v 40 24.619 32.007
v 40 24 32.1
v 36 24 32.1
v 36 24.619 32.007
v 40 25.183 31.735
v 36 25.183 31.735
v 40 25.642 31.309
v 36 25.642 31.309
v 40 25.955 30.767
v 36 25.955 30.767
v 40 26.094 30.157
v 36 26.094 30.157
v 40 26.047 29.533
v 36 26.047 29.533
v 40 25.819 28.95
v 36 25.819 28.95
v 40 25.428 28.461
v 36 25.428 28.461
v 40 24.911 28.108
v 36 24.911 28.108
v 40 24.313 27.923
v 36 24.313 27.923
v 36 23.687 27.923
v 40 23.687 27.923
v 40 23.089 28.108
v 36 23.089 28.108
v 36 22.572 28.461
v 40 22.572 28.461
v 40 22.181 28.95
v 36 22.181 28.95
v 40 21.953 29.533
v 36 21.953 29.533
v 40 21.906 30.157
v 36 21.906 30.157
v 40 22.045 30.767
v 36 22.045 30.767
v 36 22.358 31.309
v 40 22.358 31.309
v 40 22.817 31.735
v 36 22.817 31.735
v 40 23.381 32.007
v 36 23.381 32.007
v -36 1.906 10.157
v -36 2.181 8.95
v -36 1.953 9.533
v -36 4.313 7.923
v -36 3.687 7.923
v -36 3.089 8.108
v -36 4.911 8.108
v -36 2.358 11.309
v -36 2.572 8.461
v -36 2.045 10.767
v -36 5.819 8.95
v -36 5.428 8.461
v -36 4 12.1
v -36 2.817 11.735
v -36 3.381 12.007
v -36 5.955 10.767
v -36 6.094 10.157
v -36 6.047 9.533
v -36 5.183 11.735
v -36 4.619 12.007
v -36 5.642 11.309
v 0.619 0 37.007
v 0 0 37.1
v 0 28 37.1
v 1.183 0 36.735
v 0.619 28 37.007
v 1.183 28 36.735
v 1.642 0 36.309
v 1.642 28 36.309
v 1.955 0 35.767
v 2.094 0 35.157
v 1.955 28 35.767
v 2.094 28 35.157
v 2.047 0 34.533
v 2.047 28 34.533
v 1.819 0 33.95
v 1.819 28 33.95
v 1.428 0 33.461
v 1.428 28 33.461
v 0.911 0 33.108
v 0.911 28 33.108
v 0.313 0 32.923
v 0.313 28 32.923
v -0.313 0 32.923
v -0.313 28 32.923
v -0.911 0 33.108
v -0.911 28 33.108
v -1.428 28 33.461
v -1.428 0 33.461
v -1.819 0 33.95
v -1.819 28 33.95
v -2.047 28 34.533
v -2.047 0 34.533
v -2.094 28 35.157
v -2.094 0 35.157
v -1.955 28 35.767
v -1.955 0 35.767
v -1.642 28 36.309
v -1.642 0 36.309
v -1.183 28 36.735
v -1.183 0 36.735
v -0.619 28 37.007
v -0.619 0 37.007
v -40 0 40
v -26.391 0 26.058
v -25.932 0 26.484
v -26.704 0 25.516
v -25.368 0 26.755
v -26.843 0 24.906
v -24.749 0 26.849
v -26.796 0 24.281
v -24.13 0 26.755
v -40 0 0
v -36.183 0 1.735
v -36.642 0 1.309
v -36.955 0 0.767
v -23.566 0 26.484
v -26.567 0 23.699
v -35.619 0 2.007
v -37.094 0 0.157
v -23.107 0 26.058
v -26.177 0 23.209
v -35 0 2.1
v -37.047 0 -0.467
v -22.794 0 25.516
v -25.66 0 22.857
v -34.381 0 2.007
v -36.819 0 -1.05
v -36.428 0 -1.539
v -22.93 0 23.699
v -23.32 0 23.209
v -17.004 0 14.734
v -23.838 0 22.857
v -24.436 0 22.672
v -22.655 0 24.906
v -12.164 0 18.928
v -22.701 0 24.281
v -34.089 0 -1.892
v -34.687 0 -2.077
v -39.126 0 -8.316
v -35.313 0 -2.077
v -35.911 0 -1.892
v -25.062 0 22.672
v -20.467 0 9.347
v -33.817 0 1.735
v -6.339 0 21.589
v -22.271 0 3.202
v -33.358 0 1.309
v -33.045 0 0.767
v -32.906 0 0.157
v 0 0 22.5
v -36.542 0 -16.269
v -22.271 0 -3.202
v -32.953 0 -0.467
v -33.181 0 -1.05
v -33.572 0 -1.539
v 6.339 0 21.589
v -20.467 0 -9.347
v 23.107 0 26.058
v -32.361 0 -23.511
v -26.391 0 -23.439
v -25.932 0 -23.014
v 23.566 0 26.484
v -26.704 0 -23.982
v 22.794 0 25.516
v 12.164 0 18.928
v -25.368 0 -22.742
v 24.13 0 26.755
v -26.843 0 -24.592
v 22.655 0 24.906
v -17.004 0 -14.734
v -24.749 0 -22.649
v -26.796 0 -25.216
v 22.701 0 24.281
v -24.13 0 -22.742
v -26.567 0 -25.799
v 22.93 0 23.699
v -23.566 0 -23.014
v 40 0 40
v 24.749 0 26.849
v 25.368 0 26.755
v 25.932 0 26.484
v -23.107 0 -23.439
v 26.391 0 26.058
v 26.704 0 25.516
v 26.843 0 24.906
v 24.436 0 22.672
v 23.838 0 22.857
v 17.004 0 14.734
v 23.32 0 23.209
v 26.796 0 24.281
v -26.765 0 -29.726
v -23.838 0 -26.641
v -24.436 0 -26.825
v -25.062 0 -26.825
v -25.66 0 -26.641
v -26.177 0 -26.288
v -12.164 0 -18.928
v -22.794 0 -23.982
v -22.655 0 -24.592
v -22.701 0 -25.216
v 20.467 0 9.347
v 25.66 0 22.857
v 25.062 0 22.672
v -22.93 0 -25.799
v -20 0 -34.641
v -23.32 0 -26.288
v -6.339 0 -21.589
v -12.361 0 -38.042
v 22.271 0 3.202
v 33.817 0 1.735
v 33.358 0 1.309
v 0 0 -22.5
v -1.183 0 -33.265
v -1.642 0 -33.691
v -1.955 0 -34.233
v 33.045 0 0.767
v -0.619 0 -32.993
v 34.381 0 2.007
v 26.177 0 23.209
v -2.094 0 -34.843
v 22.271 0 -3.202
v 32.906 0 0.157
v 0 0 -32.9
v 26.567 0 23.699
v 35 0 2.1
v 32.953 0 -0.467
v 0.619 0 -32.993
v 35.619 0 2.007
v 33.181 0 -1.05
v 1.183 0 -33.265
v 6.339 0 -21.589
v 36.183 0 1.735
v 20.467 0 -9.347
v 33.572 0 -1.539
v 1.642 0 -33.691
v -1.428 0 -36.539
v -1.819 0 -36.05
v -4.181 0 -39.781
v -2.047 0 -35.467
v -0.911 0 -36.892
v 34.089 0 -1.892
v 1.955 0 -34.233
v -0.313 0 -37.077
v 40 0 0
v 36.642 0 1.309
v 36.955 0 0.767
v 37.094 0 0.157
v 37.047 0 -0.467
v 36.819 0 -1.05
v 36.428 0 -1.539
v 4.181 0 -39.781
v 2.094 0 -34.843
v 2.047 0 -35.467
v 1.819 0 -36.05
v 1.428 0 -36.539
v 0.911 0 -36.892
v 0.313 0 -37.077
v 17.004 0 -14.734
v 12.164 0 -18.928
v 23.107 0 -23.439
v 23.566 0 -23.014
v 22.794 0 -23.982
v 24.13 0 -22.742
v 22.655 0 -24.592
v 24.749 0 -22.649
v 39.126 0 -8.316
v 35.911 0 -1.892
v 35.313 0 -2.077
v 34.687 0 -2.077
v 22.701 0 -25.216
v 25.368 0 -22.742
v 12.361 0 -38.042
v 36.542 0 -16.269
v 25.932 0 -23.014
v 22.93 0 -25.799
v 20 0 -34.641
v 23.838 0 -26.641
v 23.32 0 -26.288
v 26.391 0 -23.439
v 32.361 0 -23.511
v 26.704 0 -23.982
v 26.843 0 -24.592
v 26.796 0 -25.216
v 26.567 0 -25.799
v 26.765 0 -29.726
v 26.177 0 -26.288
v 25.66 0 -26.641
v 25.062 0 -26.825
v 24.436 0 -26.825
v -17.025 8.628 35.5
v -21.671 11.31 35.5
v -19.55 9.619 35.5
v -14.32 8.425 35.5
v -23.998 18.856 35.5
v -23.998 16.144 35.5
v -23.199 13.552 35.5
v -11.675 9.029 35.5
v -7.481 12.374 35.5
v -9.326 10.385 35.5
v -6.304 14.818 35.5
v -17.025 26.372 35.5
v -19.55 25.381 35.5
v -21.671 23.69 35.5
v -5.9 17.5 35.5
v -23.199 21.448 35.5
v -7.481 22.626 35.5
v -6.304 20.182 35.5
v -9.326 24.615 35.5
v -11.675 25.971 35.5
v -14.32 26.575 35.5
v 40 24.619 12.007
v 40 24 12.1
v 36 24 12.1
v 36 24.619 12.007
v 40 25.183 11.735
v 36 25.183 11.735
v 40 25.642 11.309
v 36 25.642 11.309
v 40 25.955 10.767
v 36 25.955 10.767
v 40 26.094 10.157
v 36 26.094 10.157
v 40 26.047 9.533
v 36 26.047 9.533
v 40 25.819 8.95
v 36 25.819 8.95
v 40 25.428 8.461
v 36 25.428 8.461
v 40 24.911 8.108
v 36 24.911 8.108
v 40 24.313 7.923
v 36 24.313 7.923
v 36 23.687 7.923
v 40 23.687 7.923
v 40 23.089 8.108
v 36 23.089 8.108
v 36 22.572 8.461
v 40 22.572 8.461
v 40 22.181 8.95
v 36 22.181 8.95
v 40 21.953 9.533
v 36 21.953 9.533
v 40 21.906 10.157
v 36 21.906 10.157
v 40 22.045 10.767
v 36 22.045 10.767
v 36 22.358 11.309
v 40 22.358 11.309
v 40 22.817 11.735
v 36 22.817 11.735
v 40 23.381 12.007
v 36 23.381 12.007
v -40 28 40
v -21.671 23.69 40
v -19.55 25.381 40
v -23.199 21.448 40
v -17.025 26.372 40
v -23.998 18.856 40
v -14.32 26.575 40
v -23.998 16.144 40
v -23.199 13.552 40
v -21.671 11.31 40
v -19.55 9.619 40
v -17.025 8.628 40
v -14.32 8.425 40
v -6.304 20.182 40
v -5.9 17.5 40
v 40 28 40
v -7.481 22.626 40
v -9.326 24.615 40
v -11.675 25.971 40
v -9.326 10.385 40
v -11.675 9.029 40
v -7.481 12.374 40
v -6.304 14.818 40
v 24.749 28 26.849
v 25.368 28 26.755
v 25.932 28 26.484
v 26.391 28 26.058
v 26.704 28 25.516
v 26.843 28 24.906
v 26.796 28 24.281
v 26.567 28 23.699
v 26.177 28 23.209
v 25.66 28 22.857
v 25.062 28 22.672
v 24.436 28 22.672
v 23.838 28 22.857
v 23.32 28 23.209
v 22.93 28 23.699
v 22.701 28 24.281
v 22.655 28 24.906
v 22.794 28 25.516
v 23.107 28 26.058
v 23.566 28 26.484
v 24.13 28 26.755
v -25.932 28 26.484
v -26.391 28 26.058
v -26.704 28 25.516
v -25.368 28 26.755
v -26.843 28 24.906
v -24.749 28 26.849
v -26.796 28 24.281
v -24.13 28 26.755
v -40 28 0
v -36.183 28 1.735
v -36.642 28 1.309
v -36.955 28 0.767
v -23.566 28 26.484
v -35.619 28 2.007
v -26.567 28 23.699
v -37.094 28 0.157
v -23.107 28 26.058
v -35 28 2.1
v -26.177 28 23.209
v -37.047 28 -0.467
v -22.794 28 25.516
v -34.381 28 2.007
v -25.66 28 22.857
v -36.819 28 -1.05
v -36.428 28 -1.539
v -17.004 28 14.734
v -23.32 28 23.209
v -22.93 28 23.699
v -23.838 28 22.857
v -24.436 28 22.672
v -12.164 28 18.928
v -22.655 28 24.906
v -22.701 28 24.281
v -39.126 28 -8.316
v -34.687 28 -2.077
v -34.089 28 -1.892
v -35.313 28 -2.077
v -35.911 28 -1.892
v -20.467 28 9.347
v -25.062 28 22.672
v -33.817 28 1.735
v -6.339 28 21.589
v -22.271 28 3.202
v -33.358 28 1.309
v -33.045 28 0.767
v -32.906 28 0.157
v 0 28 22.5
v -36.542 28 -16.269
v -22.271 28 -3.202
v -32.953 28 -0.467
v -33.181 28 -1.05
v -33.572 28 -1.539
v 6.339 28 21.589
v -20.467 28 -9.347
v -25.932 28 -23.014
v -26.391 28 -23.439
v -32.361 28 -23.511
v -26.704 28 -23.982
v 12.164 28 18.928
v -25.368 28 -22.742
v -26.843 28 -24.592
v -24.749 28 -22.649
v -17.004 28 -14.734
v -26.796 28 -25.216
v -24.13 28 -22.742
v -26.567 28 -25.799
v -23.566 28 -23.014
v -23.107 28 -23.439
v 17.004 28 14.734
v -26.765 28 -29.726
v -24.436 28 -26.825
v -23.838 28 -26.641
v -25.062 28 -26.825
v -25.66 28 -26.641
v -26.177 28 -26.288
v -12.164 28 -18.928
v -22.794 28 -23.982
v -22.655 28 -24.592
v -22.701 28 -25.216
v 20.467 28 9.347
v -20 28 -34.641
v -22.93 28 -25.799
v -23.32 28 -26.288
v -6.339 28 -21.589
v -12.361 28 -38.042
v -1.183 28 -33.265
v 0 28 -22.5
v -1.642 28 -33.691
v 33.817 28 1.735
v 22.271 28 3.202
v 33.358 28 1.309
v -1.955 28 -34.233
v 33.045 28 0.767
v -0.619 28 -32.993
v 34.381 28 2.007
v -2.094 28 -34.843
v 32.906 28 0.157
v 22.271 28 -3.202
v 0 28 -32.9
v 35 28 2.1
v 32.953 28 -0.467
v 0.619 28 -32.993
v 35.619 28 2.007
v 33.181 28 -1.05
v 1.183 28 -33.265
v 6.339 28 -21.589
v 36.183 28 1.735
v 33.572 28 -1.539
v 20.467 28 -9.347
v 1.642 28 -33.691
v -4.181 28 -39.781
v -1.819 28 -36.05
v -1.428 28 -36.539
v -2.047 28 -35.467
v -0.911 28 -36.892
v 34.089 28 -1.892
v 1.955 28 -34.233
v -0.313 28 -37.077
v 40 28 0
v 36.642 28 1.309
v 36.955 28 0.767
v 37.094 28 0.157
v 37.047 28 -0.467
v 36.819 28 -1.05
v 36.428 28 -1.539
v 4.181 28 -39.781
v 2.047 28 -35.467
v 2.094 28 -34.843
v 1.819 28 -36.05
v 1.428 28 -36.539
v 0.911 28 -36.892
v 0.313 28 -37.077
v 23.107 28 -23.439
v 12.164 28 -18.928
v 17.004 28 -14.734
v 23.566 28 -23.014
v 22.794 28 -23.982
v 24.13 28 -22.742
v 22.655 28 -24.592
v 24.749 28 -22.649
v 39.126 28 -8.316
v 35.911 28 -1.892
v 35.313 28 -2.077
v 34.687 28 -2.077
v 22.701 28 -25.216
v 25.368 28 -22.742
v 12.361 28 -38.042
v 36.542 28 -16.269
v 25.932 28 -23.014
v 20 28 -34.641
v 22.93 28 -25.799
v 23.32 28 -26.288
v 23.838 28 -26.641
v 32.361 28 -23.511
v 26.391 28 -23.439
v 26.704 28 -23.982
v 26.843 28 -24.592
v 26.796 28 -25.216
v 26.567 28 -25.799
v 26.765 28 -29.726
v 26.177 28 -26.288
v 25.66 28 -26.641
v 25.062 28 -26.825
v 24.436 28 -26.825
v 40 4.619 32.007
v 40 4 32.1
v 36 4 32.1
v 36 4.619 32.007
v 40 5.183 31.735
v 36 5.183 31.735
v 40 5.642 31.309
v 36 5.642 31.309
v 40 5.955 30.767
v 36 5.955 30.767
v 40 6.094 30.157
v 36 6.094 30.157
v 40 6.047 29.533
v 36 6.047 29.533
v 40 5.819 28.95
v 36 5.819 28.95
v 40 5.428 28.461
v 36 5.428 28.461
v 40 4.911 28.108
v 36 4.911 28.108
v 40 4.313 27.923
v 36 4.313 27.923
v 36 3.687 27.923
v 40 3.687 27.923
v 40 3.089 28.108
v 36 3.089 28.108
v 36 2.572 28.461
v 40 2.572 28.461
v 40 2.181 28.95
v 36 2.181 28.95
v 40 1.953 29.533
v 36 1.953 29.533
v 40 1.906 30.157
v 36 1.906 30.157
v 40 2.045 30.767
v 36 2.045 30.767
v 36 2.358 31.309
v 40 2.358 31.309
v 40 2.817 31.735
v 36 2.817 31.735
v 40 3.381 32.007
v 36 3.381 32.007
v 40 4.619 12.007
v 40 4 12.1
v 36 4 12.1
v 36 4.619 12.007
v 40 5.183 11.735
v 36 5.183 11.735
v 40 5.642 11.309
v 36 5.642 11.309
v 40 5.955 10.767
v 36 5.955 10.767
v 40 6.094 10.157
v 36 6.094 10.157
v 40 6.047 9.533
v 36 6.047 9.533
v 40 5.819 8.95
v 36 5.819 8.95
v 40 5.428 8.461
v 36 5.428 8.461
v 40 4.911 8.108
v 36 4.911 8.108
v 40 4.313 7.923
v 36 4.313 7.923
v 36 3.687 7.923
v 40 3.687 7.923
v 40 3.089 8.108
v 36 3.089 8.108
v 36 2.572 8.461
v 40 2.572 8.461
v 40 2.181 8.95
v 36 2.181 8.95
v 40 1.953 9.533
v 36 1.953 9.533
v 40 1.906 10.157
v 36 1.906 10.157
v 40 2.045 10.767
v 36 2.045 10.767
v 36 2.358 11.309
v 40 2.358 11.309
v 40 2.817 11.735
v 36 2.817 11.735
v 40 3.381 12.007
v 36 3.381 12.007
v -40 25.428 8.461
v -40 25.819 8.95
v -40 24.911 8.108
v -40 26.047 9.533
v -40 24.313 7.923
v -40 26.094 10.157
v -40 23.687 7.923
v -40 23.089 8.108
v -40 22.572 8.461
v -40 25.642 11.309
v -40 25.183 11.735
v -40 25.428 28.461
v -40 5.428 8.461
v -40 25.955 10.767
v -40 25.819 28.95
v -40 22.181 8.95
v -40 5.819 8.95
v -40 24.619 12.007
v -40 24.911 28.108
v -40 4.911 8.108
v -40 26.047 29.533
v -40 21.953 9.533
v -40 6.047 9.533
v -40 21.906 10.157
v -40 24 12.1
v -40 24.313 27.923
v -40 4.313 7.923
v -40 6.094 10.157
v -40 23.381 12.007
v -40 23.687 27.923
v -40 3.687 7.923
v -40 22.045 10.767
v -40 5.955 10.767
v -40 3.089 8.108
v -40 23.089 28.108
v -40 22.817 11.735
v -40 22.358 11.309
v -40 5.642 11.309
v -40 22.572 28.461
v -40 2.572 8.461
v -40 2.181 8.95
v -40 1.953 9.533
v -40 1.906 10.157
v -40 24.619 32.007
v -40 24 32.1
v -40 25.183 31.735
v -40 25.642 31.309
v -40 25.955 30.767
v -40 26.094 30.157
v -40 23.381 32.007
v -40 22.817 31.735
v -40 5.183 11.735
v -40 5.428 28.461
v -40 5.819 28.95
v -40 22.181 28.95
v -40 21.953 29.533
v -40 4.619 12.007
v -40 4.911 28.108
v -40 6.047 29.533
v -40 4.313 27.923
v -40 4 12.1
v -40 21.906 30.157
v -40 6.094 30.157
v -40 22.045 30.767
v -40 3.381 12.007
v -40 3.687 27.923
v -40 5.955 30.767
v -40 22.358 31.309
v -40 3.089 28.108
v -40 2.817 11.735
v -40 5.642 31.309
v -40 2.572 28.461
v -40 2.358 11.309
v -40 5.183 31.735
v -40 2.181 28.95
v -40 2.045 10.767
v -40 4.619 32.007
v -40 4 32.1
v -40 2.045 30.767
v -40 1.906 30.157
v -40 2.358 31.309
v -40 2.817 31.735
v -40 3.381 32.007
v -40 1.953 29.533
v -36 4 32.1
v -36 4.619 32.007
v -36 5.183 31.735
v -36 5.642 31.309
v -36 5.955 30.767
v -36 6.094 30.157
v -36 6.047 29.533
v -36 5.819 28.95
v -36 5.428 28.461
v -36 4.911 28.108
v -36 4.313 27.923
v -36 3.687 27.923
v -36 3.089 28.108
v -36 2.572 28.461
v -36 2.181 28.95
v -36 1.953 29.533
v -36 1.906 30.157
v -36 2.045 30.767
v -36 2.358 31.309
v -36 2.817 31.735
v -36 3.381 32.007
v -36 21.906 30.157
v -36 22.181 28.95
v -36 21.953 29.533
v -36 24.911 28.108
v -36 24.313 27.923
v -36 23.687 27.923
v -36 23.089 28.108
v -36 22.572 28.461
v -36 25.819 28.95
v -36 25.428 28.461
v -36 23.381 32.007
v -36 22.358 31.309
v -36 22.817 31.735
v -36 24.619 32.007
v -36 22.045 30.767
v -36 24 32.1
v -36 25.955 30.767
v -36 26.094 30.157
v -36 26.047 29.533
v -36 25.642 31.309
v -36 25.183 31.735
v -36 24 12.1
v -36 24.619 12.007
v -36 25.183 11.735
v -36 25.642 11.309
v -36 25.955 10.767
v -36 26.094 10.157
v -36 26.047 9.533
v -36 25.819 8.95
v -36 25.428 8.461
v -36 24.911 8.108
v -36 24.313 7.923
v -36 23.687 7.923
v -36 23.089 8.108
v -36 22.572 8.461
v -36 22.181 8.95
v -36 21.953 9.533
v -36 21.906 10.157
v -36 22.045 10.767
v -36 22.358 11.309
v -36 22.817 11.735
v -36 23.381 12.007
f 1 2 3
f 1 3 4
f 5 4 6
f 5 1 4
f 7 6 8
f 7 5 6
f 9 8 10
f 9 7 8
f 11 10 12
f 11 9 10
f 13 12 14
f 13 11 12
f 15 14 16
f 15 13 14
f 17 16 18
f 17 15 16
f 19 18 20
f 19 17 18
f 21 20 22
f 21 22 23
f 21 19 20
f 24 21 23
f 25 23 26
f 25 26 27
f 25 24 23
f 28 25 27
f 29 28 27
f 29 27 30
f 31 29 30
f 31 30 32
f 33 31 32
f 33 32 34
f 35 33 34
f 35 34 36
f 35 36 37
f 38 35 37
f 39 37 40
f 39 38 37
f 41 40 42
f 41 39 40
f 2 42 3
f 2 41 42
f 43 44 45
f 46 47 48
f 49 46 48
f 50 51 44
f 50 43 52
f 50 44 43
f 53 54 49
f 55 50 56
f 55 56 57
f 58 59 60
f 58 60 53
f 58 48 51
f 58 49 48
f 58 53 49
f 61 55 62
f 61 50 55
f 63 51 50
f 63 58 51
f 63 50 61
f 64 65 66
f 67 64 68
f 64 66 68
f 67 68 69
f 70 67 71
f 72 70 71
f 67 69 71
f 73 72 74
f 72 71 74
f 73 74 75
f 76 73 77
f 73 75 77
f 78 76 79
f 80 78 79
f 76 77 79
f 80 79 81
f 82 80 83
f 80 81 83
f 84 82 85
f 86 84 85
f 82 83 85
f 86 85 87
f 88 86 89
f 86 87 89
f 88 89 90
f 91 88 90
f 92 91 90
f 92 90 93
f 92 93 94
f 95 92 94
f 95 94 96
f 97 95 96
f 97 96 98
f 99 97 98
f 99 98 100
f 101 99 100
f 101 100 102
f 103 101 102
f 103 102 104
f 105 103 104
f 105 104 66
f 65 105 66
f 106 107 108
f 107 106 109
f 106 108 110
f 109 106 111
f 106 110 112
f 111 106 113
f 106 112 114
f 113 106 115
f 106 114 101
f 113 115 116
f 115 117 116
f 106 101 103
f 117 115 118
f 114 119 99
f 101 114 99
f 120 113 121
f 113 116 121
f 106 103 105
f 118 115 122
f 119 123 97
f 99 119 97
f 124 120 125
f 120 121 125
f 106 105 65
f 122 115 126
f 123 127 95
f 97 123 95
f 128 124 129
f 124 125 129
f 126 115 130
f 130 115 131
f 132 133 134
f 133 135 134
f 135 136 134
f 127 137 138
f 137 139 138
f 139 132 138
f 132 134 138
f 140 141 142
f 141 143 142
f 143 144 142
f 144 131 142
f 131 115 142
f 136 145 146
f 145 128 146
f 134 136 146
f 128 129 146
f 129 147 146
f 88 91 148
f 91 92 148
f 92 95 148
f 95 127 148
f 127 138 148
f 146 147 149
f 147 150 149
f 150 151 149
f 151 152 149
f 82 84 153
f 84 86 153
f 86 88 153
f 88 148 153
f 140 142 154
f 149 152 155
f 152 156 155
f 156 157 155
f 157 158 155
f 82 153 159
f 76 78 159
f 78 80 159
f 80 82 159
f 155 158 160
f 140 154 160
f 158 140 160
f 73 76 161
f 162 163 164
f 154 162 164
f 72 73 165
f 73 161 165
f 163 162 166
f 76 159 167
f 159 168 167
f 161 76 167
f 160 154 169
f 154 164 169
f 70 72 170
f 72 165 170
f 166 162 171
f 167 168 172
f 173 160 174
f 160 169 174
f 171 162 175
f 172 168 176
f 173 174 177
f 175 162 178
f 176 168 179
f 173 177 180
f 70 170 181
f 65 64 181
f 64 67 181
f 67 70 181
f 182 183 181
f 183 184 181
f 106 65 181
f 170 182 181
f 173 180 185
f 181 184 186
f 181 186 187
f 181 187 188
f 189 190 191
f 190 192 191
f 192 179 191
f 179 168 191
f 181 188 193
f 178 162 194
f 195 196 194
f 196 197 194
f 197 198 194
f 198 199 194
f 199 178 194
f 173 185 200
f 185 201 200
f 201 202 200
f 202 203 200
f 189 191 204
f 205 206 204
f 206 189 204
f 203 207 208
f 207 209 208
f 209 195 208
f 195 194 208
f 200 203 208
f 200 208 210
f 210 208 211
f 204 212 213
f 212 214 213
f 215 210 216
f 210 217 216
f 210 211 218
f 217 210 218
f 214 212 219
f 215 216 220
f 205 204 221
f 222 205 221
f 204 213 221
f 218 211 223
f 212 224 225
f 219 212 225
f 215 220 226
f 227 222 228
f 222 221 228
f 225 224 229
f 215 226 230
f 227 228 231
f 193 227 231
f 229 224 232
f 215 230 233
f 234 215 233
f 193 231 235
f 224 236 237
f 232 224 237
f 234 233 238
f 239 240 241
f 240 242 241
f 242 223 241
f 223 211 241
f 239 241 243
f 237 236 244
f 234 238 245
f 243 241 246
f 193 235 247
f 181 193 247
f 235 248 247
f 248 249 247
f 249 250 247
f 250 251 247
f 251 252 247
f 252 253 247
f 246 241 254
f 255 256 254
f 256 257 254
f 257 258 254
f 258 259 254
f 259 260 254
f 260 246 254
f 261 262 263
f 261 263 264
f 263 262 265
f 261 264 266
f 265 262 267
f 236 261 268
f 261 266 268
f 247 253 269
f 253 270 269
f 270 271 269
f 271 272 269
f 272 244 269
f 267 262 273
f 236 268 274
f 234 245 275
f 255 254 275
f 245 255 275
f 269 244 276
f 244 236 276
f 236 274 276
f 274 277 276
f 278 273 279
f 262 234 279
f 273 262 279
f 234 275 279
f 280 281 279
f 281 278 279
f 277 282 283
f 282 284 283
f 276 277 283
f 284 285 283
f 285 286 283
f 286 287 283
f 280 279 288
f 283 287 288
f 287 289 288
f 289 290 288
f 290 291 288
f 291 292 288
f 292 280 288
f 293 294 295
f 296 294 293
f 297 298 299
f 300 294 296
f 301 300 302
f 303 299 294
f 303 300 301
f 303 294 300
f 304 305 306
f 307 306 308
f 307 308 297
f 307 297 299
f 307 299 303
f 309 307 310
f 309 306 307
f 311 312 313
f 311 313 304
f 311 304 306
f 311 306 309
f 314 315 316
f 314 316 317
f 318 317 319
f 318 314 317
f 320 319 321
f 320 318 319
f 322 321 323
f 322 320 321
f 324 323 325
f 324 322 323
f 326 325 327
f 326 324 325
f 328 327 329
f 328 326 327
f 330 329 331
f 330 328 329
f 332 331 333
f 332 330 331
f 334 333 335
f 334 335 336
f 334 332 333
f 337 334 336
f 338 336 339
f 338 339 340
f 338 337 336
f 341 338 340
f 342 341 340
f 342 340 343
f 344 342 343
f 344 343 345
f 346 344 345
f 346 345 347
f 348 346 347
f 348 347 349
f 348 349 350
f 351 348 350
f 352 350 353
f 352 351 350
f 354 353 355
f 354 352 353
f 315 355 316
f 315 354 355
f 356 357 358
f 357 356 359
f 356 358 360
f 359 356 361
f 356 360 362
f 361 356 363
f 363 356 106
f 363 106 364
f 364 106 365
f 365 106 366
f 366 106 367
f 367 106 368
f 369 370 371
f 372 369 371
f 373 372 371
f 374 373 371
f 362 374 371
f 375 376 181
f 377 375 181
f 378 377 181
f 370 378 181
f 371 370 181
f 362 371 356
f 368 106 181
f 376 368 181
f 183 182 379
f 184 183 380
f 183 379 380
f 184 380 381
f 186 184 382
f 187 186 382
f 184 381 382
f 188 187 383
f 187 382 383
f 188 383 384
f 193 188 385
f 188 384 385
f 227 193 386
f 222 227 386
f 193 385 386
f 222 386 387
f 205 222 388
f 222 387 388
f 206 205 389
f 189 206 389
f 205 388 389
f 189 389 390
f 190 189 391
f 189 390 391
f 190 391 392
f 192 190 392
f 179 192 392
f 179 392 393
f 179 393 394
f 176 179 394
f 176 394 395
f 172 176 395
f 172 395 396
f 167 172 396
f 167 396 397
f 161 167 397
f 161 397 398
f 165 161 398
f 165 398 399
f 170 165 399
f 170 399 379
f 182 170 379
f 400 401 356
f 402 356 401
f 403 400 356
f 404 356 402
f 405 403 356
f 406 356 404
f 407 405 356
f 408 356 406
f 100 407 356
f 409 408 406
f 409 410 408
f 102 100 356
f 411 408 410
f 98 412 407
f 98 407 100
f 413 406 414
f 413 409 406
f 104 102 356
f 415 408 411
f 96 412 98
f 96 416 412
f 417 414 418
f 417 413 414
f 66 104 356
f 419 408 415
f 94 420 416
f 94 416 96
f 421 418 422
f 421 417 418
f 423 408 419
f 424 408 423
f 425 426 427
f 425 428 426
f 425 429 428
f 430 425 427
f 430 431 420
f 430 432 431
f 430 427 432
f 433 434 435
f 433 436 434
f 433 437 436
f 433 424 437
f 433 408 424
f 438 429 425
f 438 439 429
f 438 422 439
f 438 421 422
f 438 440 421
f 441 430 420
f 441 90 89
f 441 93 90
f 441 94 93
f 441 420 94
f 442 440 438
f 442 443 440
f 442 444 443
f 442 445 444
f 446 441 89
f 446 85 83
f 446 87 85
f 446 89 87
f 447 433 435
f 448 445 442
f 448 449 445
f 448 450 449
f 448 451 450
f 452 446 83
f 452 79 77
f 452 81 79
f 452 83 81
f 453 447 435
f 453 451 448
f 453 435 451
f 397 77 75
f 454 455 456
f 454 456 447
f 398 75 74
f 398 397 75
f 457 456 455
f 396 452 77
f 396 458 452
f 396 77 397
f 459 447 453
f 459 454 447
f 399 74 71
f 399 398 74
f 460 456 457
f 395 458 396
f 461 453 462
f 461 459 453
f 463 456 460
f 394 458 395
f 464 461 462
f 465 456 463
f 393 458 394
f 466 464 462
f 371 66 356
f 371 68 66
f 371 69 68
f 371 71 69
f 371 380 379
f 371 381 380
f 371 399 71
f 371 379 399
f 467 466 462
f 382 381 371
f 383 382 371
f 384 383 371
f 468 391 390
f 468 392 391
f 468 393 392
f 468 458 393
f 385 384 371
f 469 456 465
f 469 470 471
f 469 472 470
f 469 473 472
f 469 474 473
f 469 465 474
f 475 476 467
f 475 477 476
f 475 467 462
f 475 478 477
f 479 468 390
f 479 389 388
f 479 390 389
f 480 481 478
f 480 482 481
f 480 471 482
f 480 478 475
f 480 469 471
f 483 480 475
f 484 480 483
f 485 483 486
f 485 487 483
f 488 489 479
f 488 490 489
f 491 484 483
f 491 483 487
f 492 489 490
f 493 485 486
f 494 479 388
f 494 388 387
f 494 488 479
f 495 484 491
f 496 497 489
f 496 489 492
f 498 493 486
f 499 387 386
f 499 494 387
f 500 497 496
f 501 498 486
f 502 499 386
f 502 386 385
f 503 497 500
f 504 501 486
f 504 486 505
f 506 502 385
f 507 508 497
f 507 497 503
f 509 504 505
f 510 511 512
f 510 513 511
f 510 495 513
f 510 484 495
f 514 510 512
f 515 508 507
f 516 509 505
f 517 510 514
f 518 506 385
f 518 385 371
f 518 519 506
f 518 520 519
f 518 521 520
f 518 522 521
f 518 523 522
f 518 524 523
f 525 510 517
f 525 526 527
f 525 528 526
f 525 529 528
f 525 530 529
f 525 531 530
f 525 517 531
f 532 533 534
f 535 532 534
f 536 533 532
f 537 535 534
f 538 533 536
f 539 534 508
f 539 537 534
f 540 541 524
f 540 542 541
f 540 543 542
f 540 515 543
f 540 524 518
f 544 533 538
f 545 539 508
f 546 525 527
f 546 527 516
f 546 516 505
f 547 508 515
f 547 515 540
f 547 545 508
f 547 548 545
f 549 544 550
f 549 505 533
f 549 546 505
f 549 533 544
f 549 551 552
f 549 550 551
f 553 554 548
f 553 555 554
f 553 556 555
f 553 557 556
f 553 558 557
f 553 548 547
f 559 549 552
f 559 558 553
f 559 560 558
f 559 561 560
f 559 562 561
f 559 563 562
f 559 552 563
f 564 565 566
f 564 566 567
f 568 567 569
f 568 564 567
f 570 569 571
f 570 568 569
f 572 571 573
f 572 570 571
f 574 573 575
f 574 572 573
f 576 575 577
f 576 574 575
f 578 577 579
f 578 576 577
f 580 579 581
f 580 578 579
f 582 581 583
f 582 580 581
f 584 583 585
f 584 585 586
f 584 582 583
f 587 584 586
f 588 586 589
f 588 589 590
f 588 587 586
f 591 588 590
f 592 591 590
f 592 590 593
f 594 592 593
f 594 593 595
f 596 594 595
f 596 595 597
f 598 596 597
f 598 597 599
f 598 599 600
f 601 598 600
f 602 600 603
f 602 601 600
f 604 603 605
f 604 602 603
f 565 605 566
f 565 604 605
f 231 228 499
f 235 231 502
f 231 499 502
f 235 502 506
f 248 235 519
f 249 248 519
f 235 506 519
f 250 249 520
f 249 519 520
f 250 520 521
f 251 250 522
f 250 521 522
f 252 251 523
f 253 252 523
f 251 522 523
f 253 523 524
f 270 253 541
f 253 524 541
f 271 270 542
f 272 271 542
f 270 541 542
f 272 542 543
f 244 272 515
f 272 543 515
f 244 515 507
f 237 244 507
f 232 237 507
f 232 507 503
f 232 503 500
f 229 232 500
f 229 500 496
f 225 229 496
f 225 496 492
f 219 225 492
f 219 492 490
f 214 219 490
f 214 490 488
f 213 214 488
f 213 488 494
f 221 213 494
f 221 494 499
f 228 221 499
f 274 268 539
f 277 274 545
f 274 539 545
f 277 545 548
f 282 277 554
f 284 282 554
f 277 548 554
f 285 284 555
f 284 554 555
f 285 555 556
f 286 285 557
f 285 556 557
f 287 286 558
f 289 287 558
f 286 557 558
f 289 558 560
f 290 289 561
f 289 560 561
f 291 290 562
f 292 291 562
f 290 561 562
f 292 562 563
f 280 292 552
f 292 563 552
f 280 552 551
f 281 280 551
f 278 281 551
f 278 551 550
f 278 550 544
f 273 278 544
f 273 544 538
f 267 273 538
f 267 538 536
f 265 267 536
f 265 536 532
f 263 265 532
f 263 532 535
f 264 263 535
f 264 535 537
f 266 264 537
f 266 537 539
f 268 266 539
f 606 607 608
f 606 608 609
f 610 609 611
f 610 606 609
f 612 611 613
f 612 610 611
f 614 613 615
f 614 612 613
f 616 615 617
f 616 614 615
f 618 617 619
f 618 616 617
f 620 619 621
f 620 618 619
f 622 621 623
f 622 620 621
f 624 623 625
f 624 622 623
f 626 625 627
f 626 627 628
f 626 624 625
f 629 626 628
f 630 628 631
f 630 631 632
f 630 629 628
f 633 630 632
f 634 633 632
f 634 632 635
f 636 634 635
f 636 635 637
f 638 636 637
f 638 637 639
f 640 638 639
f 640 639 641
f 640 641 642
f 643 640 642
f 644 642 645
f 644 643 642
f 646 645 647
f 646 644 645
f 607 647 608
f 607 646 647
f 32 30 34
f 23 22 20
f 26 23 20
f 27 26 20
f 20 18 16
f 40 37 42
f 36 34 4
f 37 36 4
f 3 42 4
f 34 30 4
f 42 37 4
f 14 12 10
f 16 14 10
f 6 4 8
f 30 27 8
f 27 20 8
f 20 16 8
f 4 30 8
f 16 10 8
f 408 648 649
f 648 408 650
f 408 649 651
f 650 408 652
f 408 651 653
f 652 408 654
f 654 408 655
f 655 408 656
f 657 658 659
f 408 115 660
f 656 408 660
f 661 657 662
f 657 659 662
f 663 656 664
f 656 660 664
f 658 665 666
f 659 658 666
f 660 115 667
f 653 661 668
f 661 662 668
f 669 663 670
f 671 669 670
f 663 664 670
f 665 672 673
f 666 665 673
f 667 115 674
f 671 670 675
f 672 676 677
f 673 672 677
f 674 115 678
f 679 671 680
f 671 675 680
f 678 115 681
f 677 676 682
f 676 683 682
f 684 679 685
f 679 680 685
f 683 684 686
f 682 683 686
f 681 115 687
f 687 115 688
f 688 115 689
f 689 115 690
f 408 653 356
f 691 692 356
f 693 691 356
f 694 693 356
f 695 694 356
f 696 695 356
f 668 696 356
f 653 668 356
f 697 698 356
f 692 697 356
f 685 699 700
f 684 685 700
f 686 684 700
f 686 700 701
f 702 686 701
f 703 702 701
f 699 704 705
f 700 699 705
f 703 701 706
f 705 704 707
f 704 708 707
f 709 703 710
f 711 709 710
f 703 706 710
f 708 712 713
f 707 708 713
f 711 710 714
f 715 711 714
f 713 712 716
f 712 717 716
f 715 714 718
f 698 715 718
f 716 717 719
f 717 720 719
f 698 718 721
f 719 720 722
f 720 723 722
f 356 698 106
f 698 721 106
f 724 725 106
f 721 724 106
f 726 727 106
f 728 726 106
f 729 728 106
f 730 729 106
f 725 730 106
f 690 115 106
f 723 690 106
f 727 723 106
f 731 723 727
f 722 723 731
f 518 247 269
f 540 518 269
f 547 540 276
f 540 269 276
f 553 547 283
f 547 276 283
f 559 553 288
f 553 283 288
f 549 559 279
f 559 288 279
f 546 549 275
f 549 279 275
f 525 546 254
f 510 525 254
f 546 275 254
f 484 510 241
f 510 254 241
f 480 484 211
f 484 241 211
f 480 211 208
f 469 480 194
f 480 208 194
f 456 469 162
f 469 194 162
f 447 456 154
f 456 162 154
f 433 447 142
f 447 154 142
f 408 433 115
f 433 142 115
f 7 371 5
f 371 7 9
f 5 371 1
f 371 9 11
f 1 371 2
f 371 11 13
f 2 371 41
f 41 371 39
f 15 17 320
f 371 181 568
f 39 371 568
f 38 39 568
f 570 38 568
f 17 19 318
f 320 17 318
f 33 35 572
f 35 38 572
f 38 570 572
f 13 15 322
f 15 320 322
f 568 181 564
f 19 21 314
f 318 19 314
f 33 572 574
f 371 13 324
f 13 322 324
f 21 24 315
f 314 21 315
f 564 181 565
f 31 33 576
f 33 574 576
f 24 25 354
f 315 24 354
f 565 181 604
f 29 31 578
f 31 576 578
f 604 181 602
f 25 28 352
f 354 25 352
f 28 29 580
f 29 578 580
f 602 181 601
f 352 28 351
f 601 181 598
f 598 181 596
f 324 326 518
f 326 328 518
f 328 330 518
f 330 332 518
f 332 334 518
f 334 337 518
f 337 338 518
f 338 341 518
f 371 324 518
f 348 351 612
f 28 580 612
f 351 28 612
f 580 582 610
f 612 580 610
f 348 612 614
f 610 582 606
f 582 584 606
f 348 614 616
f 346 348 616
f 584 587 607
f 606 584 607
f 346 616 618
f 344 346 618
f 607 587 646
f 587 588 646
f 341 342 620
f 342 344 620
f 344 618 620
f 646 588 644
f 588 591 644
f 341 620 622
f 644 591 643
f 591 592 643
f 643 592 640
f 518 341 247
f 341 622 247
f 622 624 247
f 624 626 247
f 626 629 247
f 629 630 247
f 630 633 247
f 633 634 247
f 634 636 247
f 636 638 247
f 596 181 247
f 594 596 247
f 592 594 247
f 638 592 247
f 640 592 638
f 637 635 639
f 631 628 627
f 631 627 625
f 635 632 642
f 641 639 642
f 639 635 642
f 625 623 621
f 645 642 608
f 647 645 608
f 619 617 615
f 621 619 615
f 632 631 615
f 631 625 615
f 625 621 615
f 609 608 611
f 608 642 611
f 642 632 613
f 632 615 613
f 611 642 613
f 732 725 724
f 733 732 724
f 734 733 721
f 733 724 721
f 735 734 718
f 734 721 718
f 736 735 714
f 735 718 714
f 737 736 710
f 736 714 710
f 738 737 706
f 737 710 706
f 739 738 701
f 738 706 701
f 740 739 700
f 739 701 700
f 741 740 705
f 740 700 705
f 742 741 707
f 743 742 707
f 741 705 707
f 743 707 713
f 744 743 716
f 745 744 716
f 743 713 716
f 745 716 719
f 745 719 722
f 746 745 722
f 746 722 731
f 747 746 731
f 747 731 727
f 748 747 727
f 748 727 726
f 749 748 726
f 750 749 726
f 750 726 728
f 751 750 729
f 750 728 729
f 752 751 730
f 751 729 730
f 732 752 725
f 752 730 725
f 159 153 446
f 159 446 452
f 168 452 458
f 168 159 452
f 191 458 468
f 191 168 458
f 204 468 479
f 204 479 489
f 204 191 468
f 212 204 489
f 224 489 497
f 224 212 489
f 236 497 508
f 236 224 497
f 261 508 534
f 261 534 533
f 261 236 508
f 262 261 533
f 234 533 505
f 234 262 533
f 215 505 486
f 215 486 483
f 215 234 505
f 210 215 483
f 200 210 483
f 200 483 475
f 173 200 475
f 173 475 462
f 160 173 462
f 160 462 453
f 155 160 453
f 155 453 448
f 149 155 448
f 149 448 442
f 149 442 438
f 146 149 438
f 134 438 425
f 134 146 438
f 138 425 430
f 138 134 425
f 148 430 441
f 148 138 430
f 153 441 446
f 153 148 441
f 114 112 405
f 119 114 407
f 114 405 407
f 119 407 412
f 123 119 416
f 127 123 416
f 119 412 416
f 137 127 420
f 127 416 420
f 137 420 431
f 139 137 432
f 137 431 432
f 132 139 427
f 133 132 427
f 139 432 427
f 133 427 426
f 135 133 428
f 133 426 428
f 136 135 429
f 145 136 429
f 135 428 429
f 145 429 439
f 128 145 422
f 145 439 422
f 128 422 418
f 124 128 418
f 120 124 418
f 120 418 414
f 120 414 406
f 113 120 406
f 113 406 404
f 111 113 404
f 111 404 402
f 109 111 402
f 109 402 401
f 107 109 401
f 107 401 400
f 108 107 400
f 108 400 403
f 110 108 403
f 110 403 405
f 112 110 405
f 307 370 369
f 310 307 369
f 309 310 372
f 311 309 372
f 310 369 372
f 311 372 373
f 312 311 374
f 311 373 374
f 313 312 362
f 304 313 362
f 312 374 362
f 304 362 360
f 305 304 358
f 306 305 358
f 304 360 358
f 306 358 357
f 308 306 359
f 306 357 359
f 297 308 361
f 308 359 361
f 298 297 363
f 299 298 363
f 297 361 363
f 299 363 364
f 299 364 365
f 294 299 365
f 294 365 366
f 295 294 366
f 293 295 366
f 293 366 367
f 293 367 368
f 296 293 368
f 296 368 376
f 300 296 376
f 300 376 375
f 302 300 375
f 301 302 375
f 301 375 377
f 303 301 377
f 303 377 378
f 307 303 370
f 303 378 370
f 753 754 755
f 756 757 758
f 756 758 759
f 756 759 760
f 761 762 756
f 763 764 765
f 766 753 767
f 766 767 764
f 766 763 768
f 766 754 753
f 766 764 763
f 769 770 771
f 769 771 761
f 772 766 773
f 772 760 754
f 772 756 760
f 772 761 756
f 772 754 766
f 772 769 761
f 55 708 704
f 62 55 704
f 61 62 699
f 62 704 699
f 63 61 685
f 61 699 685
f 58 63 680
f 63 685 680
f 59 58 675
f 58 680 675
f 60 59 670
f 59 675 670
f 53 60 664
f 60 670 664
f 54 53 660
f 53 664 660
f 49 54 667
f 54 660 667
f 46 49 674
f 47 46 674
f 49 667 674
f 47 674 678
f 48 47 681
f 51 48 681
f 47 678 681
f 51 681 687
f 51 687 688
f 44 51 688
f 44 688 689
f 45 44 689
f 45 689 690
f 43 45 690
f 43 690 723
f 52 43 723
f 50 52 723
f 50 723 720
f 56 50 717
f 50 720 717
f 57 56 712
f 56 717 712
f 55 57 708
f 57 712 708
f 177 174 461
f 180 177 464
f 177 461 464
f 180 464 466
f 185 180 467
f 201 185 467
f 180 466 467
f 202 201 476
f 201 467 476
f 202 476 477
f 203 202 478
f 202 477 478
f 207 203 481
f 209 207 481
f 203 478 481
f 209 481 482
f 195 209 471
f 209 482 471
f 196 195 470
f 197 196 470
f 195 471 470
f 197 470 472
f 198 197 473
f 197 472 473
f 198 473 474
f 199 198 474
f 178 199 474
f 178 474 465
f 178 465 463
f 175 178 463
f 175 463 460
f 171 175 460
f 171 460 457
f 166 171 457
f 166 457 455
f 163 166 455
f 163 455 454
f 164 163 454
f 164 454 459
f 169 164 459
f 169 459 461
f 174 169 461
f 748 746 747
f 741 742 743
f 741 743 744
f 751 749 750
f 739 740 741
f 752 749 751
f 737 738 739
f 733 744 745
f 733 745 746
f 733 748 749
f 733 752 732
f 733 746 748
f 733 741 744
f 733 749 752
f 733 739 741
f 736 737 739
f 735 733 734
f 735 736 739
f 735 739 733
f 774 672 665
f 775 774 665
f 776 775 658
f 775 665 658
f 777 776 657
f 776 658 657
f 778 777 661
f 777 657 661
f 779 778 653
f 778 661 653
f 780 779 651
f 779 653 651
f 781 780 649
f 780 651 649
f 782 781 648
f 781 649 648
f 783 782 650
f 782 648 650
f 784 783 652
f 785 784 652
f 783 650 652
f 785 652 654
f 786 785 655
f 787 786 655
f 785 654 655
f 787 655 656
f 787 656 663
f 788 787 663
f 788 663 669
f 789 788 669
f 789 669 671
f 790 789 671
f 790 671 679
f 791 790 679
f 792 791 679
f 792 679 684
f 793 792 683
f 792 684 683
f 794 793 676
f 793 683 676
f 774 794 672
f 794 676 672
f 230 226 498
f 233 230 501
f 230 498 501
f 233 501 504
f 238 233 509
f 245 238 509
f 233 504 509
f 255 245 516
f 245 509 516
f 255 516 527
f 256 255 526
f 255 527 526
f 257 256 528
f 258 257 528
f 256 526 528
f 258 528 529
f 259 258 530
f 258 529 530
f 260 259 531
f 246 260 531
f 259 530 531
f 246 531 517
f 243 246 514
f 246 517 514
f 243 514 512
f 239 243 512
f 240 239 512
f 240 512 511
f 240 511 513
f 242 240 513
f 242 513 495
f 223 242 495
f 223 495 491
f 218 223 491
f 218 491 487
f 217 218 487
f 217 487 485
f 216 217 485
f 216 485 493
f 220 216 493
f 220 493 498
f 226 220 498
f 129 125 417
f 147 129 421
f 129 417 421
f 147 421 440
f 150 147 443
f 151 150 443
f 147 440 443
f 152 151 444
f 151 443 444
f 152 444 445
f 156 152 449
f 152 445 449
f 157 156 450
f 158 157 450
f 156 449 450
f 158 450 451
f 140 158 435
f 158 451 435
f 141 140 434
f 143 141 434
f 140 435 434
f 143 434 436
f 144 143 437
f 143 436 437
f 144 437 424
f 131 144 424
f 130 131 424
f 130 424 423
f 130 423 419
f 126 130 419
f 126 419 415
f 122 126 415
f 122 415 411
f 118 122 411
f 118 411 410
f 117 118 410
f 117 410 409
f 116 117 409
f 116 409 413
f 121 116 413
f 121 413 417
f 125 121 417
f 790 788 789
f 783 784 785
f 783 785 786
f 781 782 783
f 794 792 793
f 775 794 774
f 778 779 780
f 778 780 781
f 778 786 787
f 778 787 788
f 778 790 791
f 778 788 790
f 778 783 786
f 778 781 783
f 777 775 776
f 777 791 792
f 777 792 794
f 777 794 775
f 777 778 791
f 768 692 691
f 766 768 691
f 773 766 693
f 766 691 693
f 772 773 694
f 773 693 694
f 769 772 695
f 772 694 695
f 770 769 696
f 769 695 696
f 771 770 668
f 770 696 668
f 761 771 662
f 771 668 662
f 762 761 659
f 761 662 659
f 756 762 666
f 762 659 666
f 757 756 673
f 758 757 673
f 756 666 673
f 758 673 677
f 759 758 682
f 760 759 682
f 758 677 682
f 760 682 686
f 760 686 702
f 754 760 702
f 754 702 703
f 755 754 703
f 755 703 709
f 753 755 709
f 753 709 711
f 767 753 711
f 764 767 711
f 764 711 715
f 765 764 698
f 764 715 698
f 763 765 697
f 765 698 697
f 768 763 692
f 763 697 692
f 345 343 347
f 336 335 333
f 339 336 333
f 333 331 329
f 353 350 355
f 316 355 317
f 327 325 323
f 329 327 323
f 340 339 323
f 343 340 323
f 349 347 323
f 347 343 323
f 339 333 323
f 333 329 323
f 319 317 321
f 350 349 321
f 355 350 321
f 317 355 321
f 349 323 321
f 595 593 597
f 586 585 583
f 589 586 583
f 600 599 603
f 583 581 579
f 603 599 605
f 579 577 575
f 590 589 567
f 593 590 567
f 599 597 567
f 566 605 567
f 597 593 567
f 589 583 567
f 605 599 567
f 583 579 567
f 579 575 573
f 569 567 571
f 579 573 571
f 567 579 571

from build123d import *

# Parameters (mm, degrees)
SKETCH_1_R          = 22.5
EXTRUDE_1_DEPTH     = 28
SKETCH_2_R          = 2.1
CUT_EXTRUDE_1_DEPTH = 64.118935352
SKETCH_6_R          = 9.1
CUT_EXTRUDE_2_DEPTH = 4.5
SKETCH_7_R          = 2.1
CUT_EXTRUDE_3_DEPTH = 4


with BuildPart() as part:
    # 草图1 → 凸台-拉伸1 (new body)
    with BuildSketch(Plane(origin=(0, 0, 0), x_dir=(1, 0, 0), z_dir=(0, 1, 0))):
        with BuildLine():
            Line((-40, 0), (-40, -40))
            Line((-40, -40), (40, -40))
            Line((40, -40), (40, 0))
            ThreePointArc((40, 0), (0, 40), (-40, 0))
        make_face()
        with Locations(Location((0, 0, 0), (0, 0, 270))):
            Circle(SKETCH_1_R, mode=Mode.SUBTRACT)
    extrude(amount=EXTRUDE_1_DEPTH)

    # 草图2 → 切除-拉伸1 (cut, through all)
    with BuildSketch(Plane(origin=(0, 28, 0), x_dir=(1, 0, 0), z_dir=(0, 1, 0))):
        with Locations(Location((0, 35, 0), (0, 0, 270))):
            Circle(SKETCH_2_R)
        with Locations(Location((24.748737342, 24.748737342, 0), (0, 0, 270))):
            Circle(SKETCH_2_R)
        with Locations(Location((35, 0, 0), (0, 0, 270))):
            Circle(SKETCH_2_R)
        with Locations(Location((24.748737342, -24.748737342, 0), (0, 0, 270))):
            Circle(SKETCH_2_R)
        with Locations(Location((0, -35, 0), (0, 0, 270))):
            Circle(SKETCH_2_R)
        with Locations(Location((-24.748737342, -24.748737342, 0), (0, 0, 270))):
            Circle(SKETCH_2_R)
        with Locations(Location((-35, 0, 0), (0, 0, 270))):
            Circle(SKETCH_2_R)
        with Locations(Location((-24.748737342, 24.748737342, 0), (0, 0, 270))):
            Circle(SKETCH_2_R)
    extrude(amount=-CUT_EXTRUDE_1_DEPTH, mode=Mode.SUBTRACT)

    # 草图6 → 切除-拉伸2 (cut)
    with BuildSketch(Plane.XY.offset(40)):
        with Locations((-15, 17.5)):
            Circle(SKETCH_6_R)
    extrude(amount=-CUT_EXTRUDE_2_DEPTH, mode=Mode.SUBTRACT)

    # 草图7 → 切除-拉伸3 (cut)
    with BuildSketch(Plane.ZY.offset(40)):
        with Locations((10, 24)):
            Circle(SKETCH_7_R)
        with Locations((30, 24)):
            Circle(SKETCH_7_R)
        with Locations((10, 4)):
            Circle(SKETCH_7_R)
        with Locations((30, 4)):
            Circle(SKETCH_7_R)
    cut_extrude_3 = extrude(amount=-CUT_EXTRUDE_3_DEPTH, mode=Mode.SUBTRACT)

    # 镜向1: 切除-拉伸3 across plane
    add(cut_extrude_3.mirror(Plane.ZY), mode=Mode.SUBTRACT)


solid = part.part
